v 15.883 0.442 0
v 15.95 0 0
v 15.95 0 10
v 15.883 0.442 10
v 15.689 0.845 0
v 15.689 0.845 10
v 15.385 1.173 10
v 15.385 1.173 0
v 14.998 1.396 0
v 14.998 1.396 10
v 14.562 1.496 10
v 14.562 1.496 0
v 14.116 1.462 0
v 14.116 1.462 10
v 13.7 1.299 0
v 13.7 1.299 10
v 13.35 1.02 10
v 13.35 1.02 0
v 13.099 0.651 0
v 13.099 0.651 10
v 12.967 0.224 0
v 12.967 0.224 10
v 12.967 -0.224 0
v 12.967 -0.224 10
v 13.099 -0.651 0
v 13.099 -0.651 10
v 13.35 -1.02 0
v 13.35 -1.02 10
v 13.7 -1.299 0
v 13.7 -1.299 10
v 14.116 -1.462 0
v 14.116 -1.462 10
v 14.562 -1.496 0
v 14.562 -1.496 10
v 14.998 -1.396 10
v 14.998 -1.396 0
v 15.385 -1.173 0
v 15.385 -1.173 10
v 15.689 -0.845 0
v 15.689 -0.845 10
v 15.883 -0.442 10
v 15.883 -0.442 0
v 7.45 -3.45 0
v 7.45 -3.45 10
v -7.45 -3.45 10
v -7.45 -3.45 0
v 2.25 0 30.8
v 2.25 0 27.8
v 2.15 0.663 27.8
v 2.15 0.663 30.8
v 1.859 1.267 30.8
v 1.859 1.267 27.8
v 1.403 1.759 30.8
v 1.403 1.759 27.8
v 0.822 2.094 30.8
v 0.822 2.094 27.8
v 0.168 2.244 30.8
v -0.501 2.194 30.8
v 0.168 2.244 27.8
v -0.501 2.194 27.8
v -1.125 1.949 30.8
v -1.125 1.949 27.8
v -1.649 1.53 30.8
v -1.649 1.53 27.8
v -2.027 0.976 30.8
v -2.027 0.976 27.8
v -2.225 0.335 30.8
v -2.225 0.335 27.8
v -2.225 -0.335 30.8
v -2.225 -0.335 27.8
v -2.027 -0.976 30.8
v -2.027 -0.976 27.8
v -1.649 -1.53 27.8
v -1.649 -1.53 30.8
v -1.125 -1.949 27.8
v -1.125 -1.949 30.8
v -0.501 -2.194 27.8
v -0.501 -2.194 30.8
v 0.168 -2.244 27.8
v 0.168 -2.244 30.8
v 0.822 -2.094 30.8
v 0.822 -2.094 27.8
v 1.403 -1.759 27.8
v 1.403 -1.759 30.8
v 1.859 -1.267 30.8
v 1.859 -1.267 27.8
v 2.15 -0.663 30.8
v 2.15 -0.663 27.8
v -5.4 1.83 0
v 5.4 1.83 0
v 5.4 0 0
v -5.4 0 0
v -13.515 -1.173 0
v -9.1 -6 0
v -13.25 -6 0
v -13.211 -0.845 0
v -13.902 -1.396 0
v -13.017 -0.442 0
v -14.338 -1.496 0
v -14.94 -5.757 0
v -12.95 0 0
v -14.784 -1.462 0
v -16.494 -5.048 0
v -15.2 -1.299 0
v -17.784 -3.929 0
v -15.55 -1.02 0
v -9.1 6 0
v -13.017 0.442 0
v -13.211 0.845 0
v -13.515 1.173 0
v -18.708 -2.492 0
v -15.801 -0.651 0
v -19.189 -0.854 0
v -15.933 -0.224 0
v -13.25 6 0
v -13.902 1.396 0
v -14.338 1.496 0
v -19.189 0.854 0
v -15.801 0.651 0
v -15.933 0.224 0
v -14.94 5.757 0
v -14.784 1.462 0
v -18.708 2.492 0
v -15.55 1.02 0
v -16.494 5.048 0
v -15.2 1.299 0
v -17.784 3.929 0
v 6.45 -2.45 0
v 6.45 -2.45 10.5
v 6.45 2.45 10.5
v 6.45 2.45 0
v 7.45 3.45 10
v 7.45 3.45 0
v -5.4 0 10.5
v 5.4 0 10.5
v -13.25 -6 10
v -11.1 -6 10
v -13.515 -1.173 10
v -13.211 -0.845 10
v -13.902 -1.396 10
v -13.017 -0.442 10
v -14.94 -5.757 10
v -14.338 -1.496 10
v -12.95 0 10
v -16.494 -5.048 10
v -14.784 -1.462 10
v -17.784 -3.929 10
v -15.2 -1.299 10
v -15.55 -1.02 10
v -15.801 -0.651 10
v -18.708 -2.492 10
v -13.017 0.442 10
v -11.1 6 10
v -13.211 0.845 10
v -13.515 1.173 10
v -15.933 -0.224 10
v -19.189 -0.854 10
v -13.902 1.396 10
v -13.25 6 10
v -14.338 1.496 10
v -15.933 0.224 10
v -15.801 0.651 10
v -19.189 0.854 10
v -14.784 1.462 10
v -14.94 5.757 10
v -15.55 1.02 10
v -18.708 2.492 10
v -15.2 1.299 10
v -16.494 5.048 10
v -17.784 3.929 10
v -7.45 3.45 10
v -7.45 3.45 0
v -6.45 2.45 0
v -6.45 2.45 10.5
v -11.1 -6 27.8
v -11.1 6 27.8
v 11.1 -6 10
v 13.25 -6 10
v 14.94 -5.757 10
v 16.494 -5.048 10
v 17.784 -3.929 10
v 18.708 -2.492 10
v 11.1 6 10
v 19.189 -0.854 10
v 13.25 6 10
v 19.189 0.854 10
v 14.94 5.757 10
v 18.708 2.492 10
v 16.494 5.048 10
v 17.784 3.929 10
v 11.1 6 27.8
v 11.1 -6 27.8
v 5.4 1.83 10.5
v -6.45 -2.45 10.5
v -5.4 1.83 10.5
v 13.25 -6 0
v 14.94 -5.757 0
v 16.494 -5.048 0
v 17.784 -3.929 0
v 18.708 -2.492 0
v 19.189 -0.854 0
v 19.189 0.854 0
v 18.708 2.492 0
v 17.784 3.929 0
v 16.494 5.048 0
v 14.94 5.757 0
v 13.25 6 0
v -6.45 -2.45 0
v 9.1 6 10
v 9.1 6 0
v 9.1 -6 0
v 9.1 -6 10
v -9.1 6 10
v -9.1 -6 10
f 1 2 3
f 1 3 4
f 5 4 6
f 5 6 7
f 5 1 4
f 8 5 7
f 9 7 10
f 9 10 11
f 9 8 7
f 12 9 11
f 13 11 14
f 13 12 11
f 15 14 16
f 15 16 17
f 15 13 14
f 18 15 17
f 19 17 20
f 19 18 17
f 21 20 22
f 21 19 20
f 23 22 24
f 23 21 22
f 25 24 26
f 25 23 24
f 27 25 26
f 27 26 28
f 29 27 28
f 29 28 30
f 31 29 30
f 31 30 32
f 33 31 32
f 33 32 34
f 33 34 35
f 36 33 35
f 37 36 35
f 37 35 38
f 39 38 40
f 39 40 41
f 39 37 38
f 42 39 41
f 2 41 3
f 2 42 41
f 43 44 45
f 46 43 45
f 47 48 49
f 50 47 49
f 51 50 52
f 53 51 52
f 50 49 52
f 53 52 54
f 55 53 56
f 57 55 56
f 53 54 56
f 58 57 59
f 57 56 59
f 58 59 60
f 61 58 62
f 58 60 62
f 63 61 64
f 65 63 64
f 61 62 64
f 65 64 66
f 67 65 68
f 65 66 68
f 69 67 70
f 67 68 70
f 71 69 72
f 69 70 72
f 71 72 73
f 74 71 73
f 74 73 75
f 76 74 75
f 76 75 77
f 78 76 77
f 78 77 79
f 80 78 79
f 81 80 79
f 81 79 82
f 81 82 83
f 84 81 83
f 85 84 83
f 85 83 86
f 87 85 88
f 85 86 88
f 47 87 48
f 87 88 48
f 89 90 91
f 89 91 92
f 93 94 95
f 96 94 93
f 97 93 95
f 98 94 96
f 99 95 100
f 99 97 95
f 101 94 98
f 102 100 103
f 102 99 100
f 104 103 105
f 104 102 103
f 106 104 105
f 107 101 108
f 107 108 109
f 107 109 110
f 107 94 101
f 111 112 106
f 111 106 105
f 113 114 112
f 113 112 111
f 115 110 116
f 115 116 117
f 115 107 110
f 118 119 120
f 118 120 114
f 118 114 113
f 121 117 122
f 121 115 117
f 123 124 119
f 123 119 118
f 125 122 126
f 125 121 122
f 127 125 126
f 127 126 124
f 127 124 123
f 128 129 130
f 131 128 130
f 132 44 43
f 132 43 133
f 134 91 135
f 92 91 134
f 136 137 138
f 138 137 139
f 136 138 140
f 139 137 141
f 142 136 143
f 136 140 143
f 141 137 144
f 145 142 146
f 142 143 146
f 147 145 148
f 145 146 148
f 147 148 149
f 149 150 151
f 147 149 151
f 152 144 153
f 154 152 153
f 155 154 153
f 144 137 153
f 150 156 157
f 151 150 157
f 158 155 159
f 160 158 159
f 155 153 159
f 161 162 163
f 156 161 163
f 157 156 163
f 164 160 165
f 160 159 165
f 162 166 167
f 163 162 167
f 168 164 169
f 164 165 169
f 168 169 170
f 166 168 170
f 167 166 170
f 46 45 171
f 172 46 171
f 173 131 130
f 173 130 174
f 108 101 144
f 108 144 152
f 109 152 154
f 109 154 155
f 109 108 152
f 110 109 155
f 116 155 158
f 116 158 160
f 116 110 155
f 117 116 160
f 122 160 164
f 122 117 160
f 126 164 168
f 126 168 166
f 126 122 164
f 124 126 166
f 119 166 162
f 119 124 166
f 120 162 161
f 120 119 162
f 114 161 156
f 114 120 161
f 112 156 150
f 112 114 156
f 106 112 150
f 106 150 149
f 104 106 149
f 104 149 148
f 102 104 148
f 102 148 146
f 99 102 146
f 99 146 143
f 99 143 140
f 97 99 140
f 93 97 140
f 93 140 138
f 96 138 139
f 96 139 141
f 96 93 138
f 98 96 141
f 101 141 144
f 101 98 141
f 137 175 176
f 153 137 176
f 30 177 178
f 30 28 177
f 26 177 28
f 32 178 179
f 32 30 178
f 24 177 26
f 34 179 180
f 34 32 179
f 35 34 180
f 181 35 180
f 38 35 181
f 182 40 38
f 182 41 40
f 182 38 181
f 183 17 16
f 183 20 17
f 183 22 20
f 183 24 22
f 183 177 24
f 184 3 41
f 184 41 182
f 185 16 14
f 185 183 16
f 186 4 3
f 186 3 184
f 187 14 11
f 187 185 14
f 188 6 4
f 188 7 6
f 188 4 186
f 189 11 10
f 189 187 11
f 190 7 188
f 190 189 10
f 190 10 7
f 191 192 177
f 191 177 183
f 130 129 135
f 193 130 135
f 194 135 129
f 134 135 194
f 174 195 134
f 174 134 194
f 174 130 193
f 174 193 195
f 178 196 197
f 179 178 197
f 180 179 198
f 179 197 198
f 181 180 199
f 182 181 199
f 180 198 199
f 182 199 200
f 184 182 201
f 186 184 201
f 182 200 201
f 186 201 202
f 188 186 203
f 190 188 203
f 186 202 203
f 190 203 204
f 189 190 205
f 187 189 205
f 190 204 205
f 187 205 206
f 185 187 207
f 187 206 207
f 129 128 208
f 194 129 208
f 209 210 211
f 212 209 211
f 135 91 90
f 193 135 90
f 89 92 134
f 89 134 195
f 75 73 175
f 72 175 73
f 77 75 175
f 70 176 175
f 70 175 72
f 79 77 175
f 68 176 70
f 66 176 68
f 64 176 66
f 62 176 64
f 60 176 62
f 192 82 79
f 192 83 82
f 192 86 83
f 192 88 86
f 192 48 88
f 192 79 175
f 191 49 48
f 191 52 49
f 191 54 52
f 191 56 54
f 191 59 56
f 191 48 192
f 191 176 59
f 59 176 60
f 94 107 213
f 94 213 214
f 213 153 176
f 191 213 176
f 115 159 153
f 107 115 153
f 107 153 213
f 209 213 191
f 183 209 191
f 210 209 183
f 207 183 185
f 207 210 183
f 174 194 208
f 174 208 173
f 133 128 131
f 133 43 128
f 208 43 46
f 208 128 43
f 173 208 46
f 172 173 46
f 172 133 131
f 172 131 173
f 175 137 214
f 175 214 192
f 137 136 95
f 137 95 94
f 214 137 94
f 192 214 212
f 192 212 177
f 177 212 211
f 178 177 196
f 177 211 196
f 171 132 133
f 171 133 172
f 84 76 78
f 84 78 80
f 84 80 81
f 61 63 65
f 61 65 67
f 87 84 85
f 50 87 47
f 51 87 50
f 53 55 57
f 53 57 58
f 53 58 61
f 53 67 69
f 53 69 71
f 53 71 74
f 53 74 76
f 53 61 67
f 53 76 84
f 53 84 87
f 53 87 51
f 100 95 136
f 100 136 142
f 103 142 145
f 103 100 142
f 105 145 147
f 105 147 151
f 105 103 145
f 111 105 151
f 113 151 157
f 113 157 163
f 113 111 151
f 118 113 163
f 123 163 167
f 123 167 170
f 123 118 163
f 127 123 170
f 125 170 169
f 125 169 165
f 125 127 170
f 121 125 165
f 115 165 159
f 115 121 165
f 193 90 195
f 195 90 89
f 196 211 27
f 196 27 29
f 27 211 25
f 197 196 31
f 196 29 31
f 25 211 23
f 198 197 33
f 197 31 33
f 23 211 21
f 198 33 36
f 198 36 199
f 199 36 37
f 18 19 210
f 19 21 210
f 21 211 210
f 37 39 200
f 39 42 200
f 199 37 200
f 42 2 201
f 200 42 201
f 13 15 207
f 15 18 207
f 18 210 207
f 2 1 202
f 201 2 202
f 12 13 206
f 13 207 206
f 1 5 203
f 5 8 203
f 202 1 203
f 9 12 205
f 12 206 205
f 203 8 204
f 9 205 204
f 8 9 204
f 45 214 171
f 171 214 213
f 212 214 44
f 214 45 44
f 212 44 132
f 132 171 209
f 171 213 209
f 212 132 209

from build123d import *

# Parameters (mm, degrees)
CROQUIS1_R                = 1.5
SALIENTE_EXTRUIR1_DEPTH   = 10
SALIENTE_EXTRUIR1_2_DEPTH = 10
CROQUIS2_W                = 22.2
CROQUIS2_H                = 12
SALIENTE_EXTRUIR2_DEPTH   = 17.8
CROQUIS3_R                = 2.25
SALIENTE_EXTRUIR3_DEPTH   = 3
CROQUIS4_W                = 14.9
CROQUIS4_H                = 6.9
SALIENTE_EXTRUIR4_DEPTH   = 10
CROQUIS5_W                = 12.9
CROQUIS5_H                = 4.9
CROQUIS5_W_2              = 10.8
CROQUIS5_H_2              = 1.83
CORTAR_EXTRUIR1_DEPTH     = 10.5


with BuildPart() as part:
    # Croquis1 → Saliente-Extruir1 (new body)
    with BuildSketch(Plane.XY):
        with BuildLine():
            Line((-9.1, 6), (-9.1, -6))
            Line((-9.1, -6), (-13.25, -6))
            ThreePointArc((-13.25, -6), (-19.25, 0), (-13.25, 6))
            Line((-13.25, 6), (-9.1, 6))
        make_face()
        with Locations((-14.45, 0)):
            Circle(CROQUIS1_R, mode=Mode.SUBTRACT)
    extrude(amount=SALIENTE_EXTRUIR1_DEPTH)



with BuildPart() as body_2:
    # Croquis1 → Saliente-Extruir1 2 (new body)
    with BuildSketch(Plane.XY):
        with BuildLine():
            Line((9.1, 6), (9.1, -6))
            Line((9.1, -6), (13.25, -6))
            ThreePointArc((13.25, -6), (19.25, 0), (13.25, 6))
            Line((13.25, 6), (9.1, 6))
        make_face()
        with Locations((14.45, 0)):
            Circle(CROQUIS1_R, mode=Mode.SUBTRACT)
    extrude(amount=SALIENTE_EXTRUIR1_2_DEPTH)


with BuildPart() as part_1:
    add(part.part)

    add(body_2.part)  # Saliente-Extruir2 merges body 2
    # Croquis2 → Saliente-Extruir2 (add)
    with BuildSketch(Plane.XY.offset(10)):
        Rectangle(CROQUIS2_W, CROQUIS2_H)
    extrude(amount=SALIENTE_EXTRUIR2_DEPTH)

    # Croquis3 → Saliente-Extruir3 (add)
    with BuildSketch(Plane.XY.offset(27.8)):
        Circle(CROQUIS3_R)
    extrude(amount=SALIENTE_EXTRUIR3_DEPTH)

    # Croquis4 → Saliente-Extruir4 (add)
    with BuildSketch(Plane(origin=(0, 0, 10), x_dir=(-1, 0, 0), z_dir=(0, 0, -1))):
        Rectangle(CROQUIS4_W, CROQUIS4_H)
    extrude(amount=SALIENTE_EXTRUIR4_DEPTH)

    # Croquis5 → Cortar-Extruir1 (cut)
    with BuildSketch(Plane(origin=(0, 0, 0), x_dir=(-1, 0, 0), z_dir=(0, 0, -1))):
        Rectangle(CROQUIS5_W, CROQUIS5_H)
        with Locations((0, 0.915)):
            Rectangle(CROQUIS5_W_2, CROQUIS5_H_2, mode=Mode.SUBTRACT)
    extrude(amount=-CORTAR_EXTRUIR1_DEPTH, mode=Mode.SUBTRACT)


solid = part_1.part
